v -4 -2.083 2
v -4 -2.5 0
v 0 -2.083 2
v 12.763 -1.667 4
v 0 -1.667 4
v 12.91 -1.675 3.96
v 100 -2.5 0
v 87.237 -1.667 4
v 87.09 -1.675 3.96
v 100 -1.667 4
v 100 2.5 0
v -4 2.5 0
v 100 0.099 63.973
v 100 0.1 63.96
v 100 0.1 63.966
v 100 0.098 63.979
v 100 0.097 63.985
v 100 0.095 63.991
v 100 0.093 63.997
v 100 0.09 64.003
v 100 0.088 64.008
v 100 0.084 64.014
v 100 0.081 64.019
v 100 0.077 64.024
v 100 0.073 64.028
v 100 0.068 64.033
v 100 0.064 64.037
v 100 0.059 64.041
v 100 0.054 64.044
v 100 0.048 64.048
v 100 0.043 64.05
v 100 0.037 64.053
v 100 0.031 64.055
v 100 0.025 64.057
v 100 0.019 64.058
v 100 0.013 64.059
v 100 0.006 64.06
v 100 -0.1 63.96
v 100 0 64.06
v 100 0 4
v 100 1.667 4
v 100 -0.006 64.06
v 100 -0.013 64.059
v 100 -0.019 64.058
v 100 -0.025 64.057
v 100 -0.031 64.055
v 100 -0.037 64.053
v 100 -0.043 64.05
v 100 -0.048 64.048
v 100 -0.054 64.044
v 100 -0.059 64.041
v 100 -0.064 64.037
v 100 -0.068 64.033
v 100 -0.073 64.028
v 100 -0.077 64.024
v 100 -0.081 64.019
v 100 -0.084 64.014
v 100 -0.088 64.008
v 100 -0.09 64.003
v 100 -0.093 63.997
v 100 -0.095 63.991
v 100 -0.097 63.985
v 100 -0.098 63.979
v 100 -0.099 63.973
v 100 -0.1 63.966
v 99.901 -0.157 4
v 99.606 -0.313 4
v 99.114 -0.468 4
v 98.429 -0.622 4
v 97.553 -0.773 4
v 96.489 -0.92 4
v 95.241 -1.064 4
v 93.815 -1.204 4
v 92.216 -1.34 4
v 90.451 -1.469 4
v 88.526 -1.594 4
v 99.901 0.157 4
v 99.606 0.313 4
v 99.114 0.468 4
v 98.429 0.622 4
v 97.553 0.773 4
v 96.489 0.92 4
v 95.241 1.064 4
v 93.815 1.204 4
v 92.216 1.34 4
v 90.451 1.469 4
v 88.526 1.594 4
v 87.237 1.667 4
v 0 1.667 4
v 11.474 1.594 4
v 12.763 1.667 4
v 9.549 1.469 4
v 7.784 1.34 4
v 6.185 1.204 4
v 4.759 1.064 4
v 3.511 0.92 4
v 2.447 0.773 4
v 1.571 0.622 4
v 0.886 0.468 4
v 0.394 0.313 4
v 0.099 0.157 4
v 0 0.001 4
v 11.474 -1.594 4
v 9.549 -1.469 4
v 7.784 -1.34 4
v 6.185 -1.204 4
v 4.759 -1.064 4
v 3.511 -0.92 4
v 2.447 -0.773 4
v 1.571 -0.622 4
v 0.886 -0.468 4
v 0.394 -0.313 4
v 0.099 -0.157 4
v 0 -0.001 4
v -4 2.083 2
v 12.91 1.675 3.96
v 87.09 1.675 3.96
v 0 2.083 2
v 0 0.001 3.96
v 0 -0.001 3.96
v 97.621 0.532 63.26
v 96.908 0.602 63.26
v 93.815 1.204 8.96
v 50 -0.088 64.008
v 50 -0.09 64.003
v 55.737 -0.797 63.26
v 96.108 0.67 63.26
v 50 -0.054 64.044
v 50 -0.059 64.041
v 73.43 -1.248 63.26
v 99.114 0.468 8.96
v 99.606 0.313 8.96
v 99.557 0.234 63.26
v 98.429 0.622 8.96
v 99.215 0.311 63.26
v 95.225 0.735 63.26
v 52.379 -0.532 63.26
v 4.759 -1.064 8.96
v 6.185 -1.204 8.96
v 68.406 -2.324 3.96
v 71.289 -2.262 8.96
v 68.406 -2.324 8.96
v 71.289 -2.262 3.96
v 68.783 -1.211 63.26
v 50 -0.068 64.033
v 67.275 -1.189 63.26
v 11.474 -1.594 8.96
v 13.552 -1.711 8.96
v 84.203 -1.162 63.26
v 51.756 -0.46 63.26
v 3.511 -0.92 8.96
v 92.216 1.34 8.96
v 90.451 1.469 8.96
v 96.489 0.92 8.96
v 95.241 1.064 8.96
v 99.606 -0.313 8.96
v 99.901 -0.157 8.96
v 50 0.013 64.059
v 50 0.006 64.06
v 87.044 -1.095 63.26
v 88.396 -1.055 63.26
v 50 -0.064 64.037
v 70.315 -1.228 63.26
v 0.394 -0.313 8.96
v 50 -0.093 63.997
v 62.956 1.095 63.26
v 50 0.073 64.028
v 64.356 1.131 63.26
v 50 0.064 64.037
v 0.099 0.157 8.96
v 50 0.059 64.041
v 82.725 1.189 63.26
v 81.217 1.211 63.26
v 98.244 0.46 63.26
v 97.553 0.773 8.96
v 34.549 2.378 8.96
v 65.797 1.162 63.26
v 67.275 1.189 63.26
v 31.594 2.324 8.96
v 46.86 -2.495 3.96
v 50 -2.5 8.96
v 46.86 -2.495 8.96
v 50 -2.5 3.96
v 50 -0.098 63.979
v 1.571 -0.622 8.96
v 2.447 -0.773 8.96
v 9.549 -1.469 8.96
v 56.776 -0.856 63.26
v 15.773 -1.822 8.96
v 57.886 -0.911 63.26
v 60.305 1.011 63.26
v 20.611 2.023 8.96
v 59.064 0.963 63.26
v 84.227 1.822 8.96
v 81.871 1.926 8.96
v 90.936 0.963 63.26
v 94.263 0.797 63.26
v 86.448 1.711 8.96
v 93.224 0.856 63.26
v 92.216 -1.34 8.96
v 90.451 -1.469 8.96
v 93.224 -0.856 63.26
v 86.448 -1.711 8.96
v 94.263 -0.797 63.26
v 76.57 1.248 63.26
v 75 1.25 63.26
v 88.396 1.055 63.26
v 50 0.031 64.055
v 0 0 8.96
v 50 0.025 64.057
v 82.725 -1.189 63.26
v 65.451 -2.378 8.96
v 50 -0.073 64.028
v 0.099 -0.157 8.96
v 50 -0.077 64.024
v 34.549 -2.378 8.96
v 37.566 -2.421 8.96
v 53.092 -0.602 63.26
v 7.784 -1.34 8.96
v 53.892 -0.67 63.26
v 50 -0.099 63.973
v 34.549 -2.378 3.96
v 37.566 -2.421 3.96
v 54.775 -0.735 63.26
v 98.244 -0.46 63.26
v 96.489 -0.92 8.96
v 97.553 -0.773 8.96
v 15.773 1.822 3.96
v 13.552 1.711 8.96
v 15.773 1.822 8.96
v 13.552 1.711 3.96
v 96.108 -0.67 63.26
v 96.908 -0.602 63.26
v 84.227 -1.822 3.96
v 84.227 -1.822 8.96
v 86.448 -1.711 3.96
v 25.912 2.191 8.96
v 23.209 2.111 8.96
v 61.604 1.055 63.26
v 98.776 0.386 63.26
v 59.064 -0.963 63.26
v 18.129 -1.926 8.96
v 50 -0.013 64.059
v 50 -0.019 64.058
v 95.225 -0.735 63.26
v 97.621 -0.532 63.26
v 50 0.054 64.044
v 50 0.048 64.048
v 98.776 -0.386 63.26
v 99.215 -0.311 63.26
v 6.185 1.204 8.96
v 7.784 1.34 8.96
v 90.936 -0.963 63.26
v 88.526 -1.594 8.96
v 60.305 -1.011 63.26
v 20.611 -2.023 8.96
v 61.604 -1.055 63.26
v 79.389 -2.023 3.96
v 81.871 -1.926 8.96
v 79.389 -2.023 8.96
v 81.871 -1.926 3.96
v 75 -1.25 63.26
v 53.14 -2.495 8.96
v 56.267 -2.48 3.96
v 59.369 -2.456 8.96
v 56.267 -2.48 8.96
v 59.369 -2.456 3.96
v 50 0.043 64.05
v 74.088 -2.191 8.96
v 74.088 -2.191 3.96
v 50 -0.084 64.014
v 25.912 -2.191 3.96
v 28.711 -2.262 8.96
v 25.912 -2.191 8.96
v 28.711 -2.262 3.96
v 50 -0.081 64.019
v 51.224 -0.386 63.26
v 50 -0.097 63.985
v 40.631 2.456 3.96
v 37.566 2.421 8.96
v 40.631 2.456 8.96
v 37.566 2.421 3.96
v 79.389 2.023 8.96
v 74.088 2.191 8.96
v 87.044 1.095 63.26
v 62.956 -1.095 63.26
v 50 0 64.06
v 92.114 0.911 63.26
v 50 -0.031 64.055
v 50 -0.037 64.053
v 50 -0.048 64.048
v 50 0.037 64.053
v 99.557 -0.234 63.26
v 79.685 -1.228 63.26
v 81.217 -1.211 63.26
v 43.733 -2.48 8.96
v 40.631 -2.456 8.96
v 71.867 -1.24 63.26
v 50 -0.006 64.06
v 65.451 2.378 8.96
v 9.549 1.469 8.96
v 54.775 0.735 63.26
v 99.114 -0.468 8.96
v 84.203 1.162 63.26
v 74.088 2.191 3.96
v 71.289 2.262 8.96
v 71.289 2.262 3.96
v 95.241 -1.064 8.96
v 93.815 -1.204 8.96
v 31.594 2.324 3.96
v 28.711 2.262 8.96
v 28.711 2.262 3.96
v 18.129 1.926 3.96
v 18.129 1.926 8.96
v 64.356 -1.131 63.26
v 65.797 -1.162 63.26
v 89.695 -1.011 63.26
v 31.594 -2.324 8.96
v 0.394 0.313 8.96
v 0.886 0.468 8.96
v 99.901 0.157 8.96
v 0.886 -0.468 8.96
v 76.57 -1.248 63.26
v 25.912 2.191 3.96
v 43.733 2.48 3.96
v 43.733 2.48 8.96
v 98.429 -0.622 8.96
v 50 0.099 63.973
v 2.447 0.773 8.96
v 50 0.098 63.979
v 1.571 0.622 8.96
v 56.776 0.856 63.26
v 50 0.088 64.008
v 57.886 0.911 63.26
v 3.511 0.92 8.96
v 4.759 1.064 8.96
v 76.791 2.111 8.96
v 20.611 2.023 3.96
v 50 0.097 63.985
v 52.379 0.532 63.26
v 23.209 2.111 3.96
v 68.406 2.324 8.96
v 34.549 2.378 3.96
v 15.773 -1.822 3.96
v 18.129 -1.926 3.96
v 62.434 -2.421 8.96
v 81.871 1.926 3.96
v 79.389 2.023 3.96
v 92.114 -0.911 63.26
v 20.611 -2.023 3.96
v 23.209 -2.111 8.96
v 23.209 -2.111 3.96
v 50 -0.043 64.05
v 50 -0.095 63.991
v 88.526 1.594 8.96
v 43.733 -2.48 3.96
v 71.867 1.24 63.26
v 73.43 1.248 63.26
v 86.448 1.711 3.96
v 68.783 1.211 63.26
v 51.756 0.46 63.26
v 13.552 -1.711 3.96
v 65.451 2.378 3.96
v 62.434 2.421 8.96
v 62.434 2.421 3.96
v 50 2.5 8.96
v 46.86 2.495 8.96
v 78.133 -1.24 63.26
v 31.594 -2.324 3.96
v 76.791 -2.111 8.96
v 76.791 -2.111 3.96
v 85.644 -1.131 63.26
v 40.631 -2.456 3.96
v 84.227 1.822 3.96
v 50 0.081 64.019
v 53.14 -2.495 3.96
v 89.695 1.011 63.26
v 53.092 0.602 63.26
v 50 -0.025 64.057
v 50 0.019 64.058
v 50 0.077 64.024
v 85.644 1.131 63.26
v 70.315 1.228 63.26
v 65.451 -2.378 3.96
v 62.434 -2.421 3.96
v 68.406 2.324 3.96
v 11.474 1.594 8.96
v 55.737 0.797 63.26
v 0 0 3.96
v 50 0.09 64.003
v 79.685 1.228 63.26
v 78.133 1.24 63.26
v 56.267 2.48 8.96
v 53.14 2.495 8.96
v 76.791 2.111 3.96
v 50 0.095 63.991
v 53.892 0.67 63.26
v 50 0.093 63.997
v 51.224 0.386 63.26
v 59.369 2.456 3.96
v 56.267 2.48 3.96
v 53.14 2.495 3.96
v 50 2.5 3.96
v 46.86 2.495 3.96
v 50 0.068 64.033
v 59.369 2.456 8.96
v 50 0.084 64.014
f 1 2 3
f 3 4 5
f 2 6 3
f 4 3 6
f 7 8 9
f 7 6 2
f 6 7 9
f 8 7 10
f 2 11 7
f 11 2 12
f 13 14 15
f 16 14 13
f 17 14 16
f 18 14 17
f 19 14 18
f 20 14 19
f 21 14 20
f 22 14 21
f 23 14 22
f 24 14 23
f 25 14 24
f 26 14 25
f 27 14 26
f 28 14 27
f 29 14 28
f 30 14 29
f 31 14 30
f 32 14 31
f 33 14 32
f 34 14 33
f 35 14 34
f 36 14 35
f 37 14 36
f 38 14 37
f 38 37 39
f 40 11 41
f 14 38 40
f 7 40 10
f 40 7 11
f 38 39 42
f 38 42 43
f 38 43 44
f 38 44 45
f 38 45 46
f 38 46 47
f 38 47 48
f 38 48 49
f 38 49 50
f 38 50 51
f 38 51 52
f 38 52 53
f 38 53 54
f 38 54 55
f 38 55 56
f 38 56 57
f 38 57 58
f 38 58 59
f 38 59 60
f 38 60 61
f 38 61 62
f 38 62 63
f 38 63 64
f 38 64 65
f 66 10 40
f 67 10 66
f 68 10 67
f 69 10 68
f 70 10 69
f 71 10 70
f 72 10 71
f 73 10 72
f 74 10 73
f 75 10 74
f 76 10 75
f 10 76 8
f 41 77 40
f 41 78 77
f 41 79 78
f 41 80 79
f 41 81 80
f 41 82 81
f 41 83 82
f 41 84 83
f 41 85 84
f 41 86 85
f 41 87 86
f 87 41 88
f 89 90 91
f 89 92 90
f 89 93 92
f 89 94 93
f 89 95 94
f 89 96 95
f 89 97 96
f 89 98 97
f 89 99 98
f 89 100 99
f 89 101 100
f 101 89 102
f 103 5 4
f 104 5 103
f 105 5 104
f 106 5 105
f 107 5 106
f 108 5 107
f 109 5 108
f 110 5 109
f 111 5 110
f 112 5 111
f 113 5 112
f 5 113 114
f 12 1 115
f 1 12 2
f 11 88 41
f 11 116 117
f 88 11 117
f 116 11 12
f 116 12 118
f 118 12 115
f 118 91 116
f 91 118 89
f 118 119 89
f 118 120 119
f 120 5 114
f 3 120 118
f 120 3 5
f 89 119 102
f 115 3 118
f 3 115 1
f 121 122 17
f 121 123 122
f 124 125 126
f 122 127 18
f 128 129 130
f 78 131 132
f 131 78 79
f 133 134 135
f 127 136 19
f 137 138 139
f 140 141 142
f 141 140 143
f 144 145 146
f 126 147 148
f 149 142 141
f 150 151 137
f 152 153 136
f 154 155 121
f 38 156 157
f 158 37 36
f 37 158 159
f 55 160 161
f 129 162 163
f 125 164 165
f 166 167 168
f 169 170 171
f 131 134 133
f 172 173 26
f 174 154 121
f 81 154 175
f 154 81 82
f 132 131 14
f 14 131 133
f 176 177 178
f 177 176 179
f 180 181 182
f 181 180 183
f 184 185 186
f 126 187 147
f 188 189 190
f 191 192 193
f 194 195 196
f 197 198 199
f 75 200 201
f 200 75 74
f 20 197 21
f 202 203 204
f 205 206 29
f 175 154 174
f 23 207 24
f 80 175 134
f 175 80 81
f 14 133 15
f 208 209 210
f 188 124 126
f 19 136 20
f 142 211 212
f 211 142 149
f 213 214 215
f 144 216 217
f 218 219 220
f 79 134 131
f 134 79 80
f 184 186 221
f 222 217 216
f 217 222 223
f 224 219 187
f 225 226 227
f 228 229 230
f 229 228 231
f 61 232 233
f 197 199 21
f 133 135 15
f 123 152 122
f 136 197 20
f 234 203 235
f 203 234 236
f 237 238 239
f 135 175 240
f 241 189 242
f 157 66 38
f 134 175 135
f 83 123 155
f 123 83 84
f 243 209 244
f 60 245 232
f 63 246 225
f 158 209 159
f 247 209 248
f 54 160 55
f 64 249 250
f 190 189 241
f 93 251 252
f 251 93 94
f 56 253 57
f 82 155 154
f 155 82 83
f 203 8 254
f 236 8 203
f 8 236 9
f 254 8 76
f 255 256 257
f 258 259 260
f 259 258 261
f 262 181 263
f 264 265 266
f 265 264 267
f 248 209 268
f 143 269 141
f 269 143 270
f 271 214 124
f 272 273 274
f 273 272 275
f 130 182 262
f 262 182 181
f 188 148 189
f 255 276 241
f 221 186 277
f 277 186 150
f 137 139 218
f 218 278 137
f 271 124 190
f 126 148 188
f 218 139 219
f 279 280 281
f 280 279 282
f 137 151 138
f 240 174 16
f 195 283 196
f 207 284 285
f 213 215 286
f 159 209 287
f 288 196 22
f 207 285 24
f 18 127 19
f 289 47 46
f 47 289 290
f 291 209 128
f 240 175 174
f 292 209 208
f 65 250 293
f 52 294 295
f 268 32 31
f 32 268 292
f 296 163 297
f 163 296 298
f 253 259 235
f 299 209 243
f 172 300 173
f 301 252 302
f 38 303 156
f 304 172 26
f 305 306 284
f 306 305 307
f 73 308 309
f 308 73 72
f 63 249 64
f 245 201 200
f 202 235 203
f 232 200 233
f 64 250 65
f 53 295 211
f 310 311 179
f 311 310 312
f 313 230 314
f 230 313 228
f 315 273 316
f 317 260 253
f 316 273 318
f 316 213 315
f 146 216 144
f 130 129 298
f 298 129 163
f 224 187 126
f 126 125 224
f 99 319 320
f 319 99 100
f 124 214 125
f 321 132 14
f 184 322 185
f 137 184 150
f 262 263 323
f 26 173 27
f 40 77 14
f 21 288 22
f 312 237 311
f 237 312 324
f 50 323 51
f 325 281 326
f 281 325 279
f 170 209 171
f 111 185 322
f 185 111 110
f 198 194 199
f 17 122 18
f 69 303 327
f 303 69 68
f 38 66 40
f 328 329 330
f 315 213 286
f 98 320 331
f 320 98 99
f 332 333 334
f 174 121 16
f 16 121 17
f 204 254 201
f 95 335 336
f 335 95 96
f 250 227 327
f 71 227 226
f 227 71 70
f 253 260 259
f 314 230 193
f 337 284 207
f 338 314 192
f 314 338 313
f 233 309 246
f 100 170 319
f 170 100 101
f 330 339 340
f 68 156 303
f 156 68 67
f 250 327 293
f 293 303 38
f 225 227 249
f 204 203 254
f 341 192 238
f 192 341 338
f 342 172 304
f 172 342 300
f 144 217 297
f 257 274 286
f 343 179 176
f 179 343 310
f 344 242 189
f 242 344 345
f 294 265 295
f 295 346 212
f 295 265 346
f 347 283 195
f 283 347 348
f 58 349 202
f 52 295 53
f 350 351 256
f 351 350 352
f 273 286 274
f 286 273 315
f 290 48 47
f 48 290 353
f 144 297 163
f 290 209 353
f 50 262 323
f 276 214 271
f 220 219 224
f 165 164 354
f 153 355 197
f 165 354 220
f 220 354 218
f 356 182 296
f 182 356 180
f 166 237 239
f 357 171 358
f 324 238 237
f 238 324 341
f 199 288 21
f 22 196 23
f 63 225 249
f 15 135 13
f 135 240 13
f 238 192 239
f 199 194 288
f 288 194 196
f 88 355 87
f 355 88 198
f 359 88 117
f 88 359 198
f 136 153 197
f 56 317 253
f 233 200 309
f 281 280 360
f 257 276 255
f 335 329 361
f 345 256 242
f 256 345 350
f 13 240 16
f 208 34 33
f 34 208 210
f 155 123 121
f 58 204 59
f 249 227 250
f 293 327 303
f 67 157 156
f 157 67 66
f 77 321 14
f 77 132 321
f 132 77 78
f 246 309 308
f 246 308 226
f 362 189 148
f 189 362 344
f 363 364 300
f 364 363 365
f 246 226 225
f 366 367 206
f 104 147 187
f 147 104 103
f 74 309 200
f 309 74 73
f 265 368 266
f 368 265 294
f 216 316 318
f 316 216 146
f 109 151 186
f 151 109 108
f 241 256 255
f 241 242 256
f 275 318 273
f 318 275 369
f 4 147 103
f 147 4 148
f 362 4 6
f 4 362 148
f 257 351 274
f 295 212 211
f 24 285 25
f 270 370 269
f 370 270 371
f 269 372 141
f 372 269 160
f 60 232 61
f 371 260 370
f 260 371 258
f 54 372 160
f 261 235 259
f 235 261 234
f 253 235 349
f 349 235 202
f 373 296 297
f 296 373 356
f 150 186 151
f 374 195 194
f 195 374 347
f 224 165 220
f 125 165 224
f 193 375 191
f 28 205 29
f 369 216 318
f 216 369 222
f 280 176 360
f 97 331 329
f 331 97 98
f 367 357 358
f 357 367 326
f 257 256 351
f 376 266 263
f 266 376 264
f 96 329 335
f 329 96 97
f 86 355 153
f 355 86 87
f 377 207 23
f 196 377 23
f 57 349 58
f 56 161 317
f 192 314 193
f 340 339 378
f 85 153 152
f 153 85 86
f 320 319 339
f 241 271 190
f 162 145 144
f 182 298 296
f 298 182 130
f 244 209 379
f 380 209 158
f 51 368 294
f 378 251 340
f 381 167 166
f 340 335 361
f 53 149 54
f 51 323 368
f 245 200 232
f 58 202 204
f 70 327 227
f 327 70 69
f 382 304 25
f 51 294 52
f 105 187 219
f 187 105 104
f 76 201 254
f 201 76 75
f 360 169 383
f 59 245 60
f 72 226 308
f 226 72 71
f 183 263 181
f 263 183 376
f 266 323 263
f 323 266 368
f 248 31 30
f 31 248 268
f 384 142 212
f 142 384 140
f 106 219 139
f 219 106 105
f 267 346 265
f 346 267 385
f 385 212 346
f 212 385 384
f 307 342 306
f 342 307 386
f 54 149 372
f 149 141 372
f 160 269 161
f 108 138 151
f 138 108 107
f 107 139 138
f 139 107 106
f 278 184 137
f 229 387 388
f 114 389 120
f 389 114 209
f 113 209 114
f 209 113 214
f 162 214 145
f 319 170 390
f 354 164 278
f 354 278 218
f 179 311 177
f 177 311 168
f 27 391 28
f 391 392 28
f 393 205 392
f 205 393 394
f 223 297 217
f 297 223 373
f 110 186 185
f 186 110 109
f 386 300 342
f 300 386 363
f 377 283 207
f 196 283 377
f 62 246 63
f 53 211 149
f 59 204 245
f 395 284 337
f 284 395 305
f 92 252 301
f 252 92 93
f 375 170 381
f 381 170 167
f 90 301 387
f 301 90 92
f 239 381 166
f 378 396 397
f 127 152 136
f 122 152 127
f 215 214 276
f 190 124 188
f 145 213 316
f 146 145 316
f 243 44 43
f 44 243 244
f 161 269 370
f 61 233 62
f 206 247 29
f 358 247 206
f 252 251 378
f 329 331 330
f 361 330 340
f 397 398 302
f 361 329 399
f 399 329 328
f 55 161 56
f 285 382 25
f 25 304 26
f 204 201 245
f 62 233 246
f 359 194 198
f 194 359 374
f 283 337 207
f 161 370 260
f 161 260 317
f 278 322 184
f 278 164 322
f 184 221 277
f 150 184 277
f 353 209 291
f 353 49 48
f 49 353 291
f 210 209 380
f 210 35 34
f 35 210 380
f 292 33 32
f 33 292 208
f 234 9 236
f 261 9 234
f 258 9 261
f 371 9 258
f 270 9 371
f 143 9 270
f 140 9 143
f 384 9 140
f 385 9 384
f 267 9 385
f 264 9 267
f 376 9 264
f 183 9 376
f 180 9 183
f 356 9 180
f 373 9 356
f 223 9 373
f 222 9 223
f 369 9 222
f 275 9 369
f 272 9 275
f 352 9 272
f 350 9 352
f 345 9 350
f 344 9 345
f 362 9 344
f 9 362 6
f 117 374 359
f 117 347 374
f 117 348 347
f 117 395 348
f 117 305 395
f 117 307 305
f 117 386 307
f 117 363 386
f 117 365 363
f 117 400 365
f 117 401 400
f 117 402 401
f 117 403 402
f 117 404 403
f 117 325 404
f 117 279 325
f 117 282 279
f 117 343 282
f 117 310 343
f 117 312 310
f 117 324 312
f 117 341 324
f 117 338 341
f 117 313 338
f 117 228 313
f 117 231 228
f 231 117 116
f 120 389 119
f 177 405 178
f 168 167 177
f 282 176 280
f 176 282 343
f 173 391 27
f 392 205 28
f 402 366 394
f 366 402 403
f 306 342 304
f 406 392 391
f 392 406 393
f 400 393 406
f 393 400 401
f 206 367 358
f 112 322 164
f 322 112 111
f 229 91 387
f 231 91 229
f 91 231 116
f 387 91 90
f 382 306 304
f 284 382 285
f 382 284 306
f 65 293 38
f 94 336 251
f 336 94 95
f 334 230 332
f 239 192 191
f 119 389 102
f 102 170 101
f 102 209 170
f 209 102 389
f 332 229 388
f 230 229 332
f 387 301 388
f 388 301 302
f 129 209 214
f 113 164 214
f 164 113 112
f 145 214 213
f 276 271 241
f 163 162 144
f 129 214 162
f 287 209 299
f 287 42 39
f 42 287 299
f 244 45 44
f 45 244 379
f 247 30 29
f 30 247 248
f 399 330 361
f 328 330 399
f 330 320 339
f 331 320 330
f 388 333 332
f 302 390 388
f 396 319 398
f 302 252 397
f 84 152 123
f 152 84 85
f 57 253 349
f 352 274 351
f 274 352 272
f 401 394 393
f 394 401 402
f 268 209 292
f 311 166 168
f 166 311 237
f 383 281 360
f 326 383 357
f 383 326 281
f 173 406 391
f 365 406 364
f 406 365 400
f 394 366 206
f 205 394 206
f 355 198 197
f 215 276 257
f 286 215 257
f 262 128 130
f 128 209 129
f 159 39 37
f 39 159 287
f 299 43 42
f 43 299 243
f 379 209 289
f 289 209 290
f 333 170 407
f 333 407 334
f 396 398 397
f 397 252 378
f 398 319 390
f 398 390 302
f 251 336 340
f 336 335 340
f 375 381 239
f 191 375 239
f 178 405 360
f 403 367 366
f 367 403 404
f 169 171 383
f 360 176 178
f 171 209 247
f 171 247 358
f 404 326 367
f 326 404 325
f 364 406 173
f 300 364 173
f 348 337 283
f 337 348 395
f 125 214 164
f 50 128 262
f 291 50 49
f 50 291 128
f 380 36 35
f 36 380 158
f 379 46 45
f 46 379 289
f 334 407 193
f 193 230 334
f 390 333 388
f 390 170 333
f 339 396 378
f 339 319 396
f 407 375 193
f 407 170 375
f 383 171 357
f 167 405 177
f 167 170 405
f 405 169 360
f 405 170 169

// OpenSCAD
// file: ../parts/fin.scad
/*
MIT License

Copyright (c) 1019 Jose D. Saura

Permission is hereby granted, free of charge, to any person obtaining a copy
of this software and associated documentation files (the "Software"), to deal
in the Software without restriction, including without limitation the rights
to use, copy, modify, merge, publish, distribute, sublicense, and/or sell
copies of the Software, and to permit persons to whom the Software is
furnished to do so, subject to the following conditions:

The above copyright notice and this permission notice shall be included in all
copies or substantial portions of the Software.

THE SOFTWARE IS PROVIDED "AS IS", WITHOUT WARRANTY OF ANY KIND, EXPRESS OR
IMPLIED, INCLUDING BUT NOT LIMITED TO THE WARRANTIES OF MERCHANTABILITY,
FITNESS FOR A PARTICULAR PURPOSE AND NONINFRINGEMENT. IN NO EVENT SHALL THE
AUTHORS OR COPYRIGHT HOLDERS BE LIABLE FOR ANY CLAIM, DAMAGES OR OTHER
LIABILITY, WHETHER IN AN ACTION OF CONTRACT, TORT OR OTHERWISE, ARISING FROM,
OUT OF OR IN CONNECTION WITH THE SOFTWARE OR THE USE OR OTHER DEALINGS IN THE
SOFTWARE.
*/

// 
// More about fins:
//  https://www.nakka-rocketry.net/fins.html 

module fin_delta_clipped(h, l, base_width, b=0) {
    
    t= base_width/l;
    
    hull() 
    {
        
        linear_extrude(100*t)
            translate([l/2,0, 0])
               scale([1, t]) circle(r=l/2);
        
        #translate([0,0, h*0.98])
        linear_extrude(10*t)
            translate([l*.75-b,0, 33])
               scale([1, t]) circle(r=l/4);
        
        #translate([l/2-b, 0, h])
            rotate([0,90,0])
                cylinder(l/2, 2*t, 2*t);
        
    }
    
}


fin_delta_clipped(h=100, l=150, base_width=5, b=10, $fn=100);
// main file
/*
MIT License

Copyright (c) 1019 Jose D. Saura

Permission is hereby granted, free of charge, to any person obtaining a copy
of this software and associated documentation files (the "Software"), to deal
in the Software without restriction, including without limitation the rights
to use, copy, modify, merge, publish, distribute, sublicense, and/or sell
copies of the Software, and to permit persons to whom the Software is
furnished to do so, subject to the following conditions:

The above copyright notice and this permission notice shall be included in all
copies or substantial portions of the Software.

THE SOFTWARE IS PROVIDED "AS IS", WITHOUT WARRANTY OF ANY KIND, EXPRESS OR
IMPLIED, INCLUDING BUT NOT LIMITED TO THE WARRANTIES OF MERCHANTABILITY,
FITNESS FOR A PARTICULAR PURPOSE AND NONINFRINGEMENT. IN NO EVENT SHALL THE
AUTHORS OR COPYRIGHT HOLDERS BE LIABLE FOR ANY CLAIM, DAMAGES OR OTHER
LIABILITY, WHETHER IN AN ACTION OF CONTRACT, TORT OR OTHERWISE, ARISING FROM,
OUT OF OR IN CONNECTION WITH THE SOFTWARE OR THE USE OR OTHER DEALINGS IN THE
SOFTWARE.
*/


use <../parts/fin.scad>

// Renders a fin and the fin support that fits into the motor tube slot
module fin(h, l, fin_slot_width, fin_slot_height, b=0) {
    
    translate([0,0,fin_slot_height*0.99])
        fin_delta_clipped(h, l, fin_slot_width, b);
    
    key_h = 0.04 * l;
    color("blue", 0.5) 
        difference() {
            translate([-key_h, 0, 0])
                rotate([90,0,90])
                    linear_extrude(l+1.*key_h)
                        polygon(polygon_slot(fin_slot_height, fin_slot_width));
                
                translate([-key_h/2, 0, fin_slot_height])
                    cube([key_h+0.001,fin_slot_width,fin_slot_height], center=true);

                //translate([h+key_h/2, 0, fin_slot_height])
                //    #cube([key_h+.001,fin_slot_width,4+fin_slot_height], center=true);

            }

    
}

function polygon_slot(fin_slot_height,fin_slot_width) = 
[[-fin_slot_width/2.,0],[-fin_slot_width/3.,fin_slot_height],[fin_slot_width/3.,fin_slot_height],[fin_slot_width/2.,0] ];

fin(60, 100, 5, 4, b=0, $fn=100);
